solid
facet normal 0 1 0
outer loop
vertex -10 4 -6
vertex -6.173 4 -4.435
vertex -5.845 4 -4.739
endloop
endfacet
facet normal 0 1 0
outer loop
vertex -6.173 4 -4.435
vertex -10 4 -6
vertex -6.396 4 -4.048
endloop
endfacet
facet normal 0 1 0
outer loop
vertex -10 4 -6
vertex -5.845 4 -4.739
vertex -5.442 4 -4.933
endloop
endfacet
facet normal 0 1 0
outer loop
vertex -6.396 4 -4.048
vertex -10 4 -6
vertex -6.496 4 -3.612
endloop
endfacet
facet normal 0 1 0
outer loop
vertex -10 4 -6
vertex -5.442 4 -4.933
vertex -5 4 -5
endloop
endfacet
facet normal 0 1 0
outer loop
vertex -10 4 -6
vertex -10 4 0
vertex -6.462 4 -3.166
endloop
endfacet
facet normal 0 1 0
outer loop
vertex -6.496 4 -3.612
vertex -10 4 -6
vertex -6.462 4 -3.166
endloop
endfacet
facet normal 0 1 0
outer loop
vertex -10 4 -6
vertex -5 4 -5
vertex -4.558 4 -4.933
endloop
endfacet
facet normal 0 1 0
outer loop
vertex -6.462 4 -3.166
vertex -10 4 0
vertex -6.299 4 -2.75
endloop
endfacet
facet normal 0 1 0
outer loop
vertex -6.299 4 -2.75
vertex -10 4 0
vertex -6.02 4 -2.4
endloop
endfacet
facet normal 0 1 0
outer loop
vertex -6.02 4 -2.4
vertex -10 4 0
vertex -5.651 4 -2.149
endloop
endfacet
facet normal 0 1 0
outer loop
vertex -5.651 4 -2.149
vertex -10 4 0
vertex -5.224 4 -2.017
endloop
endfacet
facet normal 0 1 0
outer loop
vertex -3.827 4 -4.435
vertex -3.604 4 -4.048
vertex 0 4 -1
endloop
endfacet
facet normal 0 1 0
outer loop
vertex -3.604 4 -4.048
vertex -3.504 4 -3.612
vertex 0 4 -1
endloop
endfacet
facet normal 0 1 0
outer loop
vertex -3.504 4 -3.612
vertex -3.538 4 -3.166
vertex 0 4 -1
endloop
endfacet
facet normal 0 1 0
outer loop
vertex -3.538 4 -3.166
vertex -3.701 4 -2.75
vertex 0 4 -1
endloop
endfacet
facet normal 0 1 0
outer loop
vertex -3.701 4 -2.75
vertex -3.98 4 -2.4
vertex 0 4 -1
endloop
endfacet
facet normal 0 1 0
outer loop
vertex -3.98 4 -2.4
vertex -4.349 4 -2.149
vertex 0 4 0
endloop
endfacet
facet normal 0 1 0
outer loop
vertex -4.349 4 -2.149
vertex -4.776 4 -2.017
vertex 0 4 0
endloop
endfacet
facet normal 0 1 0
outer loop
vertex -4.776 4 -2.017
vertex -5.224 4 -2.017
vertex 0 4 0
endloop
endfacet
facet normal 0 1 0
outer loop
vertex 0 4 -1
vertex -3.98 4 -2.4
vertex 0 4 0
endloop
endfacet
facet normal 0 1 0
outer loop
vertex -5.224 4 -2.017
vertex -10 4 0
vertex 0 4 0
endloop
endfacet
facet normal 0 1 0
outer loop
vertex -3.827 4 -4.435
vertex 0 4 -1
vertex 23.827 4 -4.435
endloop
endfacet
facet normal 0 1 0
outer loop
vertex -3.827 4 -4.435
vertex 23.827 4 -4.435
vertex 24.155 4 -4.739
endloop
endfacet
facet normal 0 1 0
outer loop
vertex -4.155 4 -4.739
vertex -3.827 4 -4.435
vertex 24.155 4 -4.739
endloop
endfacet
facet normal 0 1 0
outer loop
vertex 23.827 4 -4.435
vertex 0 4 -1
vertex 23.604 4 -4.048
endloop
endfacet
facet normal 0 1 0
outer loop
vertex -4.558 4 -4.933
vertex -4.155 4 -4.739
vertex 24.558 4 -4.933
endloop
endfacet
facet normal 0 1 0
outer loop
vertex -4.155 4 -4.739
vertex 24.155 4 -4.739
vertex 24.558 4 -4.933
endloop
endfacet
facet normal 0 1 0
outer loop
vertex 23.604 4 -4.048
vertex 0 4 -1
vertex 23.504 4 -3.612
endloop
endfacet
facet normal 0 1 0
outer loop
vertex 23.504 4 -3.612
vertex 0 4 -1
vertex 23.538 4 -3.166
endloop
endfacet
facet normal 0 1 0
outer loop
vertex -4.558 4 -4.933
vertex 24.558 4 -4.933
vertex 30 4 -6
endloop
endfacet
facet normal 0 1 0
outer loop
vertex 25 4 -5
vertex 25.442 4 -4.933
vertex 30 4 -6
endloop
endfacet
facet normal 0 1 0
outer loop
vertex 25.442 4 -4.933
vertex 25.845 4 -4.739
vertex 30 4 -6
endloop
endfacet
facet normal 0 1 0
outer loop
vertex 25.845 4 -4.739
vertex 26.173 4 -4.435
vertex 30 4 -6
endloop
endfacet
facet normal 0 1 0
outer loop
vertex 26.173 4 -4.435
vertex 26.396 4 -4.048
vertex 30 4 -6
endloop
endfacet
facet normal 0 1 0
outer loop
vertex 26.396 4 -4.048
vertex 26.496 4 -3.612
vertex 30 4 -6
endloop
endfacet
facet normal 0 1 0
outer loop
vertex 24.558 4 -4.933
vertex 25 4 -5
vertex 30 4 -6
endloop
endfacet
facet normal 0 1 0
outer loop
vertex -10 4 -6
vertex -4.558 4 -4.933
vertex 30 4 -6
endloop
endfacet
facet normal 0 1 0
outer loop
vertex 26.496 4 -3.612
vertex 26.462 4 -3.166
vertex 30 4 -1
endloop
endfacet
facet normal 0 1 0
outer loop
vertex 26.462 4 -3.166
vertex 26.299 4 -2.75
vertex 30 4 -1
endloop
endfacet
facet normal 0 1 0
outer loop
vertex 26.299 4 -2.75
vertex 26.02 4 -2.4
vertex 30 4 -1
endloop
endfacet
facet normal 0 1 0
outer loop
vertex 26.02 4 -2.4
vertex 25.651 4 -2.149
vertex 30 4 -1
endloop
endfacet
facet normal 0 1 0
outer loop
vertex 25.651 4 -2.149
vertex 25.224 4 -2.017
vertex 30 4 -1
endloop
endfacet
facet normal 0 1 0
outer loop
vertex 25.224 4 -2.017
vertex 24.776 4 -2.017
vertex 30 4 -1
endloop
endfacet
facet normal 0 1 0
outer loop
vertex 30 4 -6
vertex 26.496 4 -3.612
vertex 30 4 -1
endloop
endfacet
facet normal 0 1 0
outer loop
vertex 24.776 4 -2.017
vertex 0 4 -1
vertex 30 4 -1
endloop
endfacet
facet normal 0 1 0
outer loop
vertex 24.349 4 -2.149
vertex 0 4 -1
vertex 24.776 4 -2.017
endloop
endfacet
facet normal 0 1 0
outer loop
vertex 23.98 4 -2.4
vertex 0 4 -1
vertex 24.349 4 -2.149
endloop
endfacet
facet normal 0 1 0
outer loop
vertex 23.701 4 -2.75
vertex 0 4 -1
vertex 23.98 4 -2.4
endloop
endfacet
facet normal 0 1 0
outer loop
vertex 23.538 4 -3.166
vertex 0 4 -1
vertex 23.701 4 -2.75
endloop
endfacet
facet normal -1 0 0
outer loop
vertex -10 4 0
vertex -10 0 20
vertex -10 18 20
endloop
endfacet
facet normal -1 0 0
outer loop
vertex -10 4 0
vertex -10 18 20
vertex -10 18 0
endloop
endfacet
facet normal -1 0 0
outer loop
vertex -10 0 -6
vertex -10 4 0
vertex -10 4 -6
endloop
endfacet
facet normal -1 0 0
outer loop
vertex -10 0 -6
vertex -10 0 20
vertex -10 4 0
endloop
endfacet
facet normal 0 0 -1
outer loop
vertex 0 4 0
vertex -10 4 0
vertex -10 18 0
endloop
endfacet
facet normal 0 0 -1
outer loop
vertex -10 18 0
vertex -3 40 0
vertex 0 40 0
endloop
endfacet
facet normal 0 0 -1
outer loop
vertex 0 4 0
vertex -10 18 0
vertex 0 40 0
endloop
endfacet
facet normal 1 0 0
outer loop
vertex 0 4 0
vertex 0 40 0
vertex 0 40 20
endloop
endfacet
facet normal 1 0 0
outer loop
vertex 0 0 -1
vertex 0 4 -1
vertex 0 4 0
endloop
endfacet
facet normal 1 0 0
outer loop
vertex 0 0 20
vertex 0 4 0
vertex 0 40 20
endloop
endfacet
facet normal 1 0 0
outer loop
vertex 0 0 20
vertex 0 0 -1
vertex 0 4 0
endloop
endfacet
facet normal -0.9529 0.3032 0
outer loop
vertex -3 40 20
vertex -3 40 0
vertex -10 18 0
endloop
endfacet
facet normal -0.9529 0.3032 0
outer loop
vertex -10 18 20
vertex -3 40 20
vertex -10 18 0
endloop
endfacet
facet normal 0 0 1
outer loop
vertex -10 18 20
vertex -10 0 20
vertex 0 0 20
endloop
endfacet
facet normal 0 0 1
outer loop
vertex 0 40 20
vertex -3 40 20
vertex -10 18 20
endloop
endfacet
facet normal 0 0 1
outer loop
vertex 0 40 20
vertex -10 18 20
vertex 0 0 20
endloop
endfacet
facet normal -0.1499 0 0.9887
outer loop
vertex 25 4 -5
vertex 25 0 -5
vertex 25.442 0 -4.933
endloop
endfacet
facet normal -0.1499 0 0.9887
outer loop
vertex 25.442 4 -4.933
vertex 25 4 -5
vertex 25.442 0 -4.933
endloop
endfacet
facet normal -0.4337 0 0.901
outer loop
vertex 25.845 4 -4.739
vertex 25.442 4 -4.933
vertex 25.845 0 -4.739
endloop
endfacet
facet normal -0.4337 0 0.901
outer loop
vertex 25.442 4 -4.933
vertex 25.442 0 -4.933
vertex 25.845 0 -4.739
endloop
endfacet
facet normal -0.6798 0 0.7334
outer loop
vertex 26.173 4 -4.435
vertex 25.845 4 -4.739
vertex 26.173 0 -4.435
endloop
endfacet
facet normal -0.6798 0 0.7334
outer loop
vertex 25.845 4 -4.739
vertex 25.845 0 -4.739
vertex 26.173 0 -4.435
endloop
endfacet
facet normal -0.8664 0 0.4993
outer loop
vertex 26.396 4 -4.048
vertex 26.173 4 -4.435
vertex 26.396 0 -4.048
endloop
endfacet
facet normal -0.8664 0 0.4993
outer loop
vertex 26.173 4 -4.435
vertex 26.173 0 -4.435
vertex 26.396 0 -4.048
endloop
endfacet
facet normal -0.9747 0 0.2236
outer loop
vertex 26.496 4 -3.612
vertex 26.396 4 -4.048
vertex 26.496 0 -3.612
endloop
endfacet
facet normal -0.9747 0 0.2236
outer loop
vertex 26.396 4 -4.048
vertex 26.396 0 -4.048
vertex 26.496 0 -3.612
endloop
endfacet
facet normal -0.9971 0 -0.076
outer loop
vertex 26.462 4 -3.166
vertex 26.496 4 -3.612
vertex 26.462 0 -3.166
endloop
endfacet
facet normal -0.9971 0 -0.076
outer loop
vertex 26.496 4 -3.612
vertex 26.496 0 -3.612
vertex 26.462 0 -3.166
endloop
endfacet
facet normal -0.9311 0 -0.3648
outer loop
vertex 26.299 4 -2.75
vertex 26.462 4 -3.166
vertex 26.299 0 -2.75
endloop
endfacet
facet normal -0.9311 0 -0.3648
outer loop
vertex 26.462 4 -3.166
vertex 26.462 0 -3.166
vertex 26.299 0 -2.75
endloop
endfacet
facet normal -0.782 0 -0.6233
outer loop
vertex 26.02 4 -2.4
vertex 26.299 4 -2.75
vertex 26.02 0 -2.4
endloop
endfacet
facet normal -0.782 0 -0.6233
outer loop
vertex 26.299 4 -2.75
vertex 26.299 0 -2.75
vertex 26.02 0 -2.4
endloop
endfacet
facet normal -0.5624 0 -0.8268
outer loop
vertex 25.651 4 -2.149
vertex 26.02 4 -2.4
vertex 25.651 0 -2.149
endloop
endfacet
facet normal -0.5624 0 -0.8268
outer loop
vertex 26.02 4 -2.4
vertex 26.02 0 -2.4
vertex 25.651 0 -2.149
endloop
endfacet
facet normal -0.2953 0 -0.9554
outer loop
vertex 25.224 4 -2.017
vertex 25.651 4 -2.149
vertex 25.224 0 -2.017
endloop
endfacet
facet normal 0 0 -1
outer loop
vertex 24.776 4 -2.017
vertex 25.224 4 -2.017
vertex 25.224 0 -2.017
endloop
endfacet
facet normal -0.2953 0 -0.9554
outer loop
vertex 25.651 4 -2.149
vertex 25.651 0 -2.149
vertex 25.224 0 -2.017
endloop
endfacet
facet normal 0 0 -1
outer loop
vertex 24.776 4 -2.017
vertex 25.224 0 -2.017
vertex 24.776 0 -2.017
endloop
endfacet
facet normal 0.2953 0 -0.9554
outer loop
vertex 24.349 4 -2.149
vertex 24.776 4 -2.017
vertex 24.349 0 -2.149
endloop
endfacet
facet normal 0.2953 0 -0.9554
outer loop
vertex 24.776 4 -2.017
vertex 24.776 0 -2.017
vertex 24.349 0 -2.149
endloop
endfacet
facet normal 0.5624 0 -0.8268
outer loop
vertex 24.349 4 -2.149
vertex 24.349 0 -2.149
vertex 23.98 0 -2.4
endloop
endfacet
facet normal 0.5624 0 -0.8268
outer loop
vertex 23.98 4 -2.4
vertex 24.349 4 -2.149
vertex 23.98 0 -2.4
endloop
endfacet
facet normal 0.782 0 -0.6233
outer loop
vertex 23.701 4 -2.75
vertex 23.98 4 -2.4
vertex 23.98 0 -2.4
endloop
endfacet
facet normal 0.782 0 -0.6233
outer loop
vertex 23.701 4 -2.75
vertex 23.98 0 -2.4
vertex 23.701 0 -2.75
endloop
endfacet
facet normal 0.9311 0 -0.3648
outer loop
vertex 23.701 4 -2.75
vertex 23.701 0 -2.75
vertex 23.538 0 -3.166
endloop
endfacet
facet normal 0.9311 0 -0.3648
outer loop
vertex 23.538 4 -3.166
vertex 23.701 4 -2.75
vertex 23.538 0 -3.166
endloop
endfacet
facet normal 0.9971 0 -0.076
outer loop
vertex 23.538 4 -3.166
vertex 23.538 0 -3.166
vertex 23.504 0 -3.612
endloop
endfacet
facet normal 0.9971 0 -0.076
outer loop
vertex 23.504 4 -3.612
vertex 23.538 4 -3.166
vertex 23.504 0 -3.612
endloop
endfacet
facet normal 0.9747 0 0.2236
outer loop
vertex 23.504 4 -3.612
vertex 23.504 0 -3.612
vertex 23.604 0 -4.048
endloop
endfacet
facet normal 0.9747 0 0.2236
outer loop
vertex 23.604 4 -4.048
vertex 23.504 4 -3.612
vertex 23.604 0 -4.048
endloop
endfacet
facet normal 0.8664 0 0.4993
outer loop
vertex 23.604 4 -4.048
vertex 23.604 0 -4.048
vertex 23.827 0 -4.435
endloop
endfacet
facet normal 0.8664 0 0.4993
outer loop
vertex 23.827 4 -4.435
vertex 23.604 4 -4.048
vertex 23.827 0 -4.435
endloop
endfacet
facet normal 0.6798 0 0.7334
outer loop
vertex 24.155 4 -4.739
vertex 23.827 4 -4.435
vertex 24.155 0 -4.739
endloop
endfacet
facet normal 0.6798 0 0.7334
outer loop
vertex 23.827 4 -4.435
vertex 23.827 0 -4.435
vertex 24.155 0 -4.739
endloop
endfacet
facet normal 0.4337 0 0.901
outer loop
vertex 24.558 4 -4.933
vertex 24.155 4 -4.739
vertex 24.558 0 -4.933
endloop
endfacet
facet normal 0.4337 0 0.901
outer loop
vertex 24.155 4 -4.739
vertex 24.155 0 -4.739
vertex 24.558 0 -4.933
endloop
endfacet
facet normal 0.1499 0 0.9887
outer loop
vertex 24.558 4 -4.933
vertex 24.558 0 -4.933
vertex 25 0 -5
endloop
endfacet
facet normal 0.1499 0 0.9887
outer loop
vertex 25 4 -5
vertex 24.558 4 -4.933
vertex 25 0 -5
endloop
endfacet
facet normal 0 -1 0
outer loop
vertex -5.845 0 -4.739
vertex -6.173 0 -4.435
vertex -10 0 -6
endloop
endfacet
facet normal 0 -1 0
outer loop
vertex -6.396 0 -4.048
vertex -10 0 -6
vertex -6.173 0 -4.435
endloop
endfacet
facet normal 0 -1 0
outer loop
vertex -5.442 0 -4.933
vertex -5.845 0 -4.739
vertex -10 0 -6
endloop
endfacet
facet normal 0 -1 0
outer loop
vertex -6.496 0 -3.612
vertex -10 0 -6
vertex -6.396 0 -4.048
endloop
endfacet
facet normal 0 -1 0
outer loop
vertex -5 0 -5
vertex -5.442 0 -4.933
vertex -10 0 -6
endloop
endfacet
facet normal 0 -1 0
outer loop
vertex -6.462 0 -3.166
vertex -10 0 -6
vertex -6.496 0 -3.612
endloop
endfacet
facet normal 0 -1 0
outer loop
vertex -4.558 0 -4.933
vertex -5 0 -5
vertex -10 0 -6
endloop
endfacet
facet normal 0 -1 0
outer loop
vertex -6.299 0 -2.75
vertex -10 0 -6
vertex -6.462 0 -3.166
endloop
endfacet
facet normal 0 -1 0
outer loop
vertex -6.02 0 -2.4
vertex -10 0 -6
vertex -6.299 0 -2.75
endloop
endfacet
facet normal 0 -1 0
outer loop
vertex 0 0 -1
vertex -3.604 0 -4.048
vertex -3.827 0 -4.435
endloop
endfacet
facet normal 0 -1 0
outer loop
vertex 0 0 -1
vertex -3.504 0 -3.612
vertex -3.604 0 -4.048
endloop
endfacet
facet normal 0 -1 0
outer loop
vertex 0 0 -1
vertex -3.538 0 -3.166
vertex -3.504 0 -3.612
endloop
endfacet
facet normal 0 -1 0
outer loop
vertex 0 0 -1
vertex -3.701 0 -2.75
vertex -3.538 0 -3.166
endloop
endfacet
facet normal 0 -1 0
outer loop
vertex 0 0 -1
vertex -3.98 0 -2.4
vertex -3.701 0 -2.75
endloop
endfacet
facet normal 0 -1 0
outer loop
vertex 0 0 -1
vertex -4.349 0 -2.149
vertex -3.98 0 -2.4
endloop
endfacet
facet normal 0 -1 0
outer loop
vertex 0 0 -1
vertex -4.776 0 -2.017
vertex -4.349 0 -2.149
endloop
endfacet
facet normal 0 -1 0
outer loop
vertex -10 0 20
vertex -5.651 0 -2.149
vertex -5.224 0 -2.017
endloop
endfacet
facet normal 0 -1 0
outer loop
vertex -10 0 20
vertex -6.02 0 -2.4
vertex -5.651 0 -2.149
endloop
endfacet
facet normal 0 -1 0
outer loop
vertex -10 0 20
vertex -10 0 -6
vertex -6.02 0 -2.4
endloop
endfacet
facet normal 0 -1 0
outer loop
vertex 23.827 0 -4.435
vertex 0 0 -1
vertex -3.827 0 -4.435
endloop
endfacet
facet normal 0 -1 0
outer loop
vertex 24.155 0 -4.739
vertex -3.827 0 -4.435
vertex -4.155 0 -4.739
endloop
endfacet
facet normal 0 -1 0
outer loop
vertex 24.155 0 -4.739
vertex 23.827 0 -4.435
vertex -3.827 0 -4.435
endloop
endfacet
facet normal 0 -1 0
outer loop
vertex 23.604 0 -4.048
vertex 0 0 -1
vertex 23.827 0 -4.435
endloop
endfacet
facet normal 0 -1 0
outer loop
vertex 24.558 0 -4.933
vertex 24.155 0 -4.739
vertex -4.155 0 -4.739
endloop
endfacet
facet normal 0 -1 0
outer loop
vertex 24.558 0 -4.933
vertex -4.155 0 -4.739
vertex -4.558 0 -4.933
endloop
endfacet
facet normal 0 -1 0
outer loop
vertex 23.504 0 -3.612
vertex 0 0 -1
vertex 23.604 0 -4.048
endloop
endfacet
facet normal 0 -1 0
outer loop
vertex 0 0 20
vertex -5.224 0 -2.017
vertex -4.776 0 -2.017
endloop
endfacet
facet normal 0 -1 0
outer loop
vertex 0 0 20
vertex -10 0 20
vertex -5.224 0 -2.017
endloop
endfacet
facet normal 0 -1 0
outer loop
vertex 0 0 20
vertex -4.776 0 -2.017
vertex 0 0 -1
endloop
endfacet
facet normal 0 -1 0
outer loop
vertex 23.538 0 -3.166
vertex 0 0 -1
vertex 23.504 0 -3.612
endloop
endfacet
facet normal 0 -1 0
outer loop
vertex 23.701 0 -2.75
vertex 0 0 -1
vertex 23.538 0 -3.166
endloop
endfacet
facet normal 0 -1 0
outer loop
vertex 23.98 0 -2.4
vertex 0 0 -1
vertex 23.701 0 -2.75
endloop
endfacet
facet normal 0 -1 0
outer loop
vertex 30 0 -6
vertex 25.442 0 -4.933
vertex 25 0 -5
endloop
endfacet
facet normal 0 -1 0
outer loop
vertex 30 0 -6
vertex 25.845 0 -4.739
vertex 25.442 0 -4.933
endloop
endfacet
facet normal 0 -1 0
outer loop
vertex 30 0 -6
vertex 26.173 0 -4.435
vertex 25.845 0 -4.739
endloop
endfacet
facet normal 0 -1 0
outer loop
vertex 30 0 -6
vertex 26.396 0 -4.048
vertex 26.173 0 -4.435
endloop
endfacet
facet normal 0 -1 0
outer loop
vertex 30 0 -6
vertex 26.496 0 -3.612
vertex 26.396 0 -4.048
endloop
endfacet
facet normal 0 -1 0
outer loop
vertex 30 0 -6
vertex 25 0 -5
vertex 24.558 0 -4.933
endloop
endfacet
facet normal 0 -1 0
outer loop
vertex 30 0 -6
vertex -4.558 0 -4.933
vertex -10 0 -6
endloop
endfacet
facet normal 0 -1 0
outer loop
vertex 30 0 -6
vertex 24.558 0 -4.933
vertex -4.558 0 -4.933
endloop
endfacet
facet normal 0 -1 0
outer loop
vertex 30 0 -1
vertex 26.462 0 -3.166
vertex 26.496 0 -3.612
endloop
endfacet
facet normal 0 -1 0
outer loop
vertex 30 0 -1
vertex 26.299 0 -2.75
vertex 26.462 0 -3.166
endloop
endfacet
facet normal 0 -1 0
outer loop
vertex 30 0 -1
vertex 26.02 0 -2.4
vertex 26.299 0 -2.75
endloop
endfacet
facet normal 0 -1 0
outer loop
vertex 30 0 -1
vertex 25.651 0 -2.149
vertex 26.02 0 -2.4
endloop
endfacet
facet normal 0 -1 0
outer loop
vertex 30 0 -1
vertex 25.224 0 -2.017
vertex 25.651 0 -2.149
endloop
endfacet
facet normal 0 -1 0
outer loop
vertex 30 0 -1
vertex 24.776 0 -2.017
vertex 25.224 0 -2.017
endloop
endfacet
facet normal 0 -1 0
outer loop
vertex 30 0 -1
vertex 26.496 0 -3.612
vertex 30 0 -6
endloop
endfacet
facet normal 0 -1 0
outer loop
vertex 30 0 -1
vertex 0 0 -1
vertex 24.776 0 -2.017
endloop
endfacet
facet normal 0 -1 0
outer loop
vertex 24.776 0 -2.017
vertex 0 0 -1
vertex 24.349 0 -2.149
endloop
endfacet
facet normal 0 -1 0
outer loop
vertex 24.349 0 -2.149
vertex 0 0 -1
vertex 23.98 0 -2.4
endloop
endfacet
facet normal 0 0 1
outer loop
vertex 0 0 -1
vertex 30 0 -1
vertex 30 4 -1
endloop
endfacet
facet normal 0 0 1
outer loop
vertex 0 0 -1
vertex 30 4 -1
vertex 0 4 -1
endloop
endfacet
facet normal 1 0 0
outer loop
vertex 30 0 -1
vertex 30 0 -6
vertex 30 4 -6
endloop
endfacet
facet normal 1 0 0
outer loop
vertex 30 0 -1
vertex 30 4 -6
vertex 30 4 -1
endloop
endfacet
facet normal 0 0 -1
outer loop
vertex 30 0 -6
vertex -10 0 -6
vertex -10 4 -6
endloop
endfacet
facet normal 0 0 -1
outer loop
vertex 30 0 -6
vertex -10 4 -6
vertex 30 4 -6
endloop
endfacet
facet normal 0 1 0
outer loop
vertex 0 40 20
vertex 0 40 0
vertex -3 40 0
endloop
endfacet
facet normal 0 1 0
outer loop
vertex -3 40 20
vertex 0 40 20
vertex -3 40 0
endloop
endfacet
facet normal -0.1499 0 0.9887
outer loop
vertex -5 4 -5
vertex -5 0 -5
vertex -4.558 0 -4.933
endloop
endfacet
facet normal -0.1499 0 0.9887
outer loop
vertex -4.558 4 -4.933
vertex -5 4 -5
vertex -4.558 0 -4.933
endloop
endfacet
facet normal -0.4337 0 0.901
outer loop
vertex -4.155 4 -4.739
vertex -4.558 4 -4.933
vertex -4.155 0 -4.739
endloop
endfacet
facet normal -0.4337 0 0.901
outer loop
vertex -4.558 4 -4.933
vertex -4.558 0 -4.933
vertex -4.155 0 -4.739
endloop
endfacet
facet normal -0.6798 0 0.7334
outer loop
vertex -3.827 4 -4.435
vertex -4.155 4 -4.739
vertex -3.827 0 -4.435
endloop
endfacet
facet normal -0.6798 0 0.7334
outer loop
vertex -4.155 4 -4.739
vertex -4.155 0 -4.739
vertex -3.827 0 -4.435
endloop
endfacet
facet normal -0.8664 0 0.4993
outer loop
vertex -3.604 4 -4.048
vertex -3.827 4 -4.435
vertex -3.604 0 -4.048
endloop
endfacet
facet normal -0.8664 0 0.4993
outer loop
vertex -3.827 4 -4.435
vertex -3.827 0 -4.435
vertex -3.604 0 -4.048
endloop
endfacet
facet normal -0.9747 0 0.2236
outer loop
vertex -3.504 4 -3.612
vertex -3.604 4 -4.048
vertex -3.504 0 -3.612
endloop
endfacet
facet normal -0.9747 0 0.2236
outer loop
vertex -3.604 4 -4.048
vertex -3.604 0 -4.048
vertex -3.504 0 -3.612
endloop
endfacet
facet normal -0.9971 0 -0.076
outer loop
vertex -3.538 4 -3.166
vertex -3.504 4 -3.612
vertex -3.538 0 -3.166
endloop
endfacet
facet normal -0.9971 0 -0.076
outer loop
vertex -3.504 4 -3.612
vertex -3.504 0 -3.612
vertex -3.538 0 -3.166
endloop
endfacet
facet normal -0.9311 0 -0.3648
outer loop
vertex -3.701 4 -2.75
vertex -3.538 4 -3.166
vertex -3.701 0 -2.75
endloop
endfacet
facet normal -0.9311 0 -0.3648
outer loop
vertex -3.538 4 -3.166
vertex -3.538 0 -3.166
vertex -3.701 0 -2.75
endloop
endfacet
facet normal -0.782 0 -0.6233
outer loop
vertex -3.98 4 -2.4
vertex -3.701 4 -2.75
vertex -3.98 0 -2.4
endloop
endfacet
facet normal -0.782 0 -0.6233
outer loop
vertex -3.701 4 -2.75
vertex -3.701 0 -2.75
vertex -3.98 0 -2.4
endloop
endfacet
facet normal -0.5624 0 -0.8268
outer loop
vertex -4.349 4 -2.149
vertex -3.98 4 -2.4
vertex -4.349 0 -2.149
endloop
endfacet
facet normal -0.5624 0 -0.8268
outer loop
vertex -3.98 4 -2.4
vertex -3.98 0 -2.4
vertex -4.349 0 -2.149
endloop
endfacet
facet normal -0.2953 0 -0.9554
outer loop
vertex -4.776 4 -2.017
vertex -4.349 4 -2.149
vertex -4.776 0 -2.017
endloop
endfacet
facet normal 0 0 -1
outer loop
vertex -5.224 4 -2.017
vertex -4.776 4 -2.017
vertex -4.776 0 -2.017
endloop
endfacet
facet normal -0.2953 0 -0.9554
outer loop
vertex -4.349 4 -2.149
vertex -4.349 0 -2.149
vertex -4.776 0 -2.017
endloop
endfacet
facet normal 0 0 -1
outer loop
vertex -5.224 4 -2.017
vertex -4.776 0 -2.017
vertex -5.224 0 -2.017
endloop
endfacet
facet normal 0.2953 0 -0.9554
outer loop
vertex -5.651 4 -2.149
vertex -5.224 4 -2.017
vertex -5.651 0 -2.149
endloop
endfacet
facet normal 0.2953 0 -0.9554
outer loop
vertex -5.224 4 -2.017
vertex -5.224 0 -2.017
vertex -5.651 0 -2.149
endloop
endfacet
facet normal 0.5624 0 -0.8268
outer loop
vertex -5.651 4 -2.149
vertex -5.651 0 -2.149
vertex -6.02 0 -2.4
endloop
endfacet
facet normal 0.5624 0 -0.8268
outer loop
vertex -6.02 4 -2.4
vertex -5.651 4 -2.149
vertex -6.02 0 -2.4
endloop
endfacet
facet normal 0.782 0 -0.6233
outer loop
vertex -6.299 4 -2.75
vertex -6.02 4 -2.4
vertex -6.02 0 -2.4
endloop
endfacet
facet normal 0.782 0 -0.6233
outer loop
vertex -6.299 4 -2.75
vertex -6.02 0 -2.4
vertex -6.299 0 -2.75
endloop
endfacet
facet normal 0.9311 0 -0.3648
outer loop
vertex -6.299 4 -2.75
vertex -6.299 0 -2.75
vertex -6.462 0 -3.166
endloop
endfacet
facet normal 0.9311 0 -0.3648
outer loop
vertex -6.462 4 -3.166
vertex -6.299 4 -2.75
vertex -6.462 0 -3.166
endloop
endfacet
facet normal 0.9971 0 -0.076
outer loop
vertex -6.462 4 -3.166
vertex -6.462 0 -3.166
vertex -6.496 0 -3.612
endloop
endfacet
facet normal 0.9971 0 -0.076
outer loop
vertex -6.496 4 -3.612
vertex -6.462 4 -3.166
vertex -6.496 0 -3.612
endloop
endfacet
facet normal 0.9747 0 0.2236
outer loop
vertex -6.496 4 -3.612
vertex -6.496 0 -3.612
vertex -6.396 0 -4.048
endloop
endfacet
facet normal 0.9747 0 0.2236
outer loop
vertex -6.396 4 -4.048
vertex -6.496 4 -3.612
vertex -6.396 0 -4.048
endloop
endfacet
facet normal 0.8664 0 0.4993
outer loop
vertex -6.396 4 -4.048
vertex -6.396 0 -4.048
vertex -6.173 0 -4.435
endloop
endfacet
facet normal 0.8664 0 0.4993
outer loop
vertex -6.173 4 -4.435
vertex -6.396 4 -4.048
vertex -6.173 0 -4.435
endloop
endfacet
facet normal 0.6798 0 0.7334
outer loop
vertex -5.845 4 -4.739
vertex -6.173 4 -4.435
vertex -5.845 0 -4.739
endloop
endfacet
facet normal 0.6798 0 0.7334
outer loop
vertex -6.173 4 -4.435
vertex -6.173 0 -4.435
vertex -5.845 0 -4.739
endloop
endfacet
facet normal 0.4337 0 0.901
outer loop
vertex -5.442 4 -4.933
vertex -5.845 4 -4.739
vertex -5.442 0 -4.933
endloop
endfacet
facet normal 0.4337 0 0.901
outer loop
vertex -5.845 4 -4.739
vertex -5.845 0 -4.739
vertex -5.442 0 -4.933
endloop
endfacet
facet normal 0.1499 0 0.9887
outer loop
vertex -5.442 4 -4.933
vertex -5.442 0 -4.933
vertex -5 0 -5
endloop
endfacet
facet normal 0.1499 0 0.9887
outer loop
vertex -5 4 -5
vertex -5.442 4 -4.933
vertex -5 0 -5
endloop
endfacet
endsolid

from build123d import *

# Parameters (mm, degrees)
BOSS_EXTRUDE1_DEPTH = 20
SKETCH2_R           = 1.5
BOSS_EXTRUDE2_DEPTH = 4


with BuildPart() as part:
    # Sketch1 → Boss-Extrude1 (new body)
    with BuildSketch(Plane.XY):
        Polygon((0, 0), (0, 40), (-3, 40), (-10, 18), (-10, 0), align=None)
    extrude(amount=BOSS_EXTRUDE1_DEPTH)

    # Sketch2 → Boss-Extrude2 (add)
    with BuildSketch(Plane.XZ):
        Polygon((-10, 0), (-10, -6), (30, -6), (30, -1), (0, -1), (0, 0), align=None)
        with Locations(Location((25, -3.5, 0), (0, 0, 270))):
            Circle(SKETCH2_R, mode=Mode.SUBTRACT)
        with Locations(Location((-5, -3.5, 0), (0, 0, 270))):
            Circle(SKETCH2_R, mode=Mode.SUBTRACT)
    extrude(amount=-BOSS_EXTRUDE2_DEPTH)


solid = part.part
